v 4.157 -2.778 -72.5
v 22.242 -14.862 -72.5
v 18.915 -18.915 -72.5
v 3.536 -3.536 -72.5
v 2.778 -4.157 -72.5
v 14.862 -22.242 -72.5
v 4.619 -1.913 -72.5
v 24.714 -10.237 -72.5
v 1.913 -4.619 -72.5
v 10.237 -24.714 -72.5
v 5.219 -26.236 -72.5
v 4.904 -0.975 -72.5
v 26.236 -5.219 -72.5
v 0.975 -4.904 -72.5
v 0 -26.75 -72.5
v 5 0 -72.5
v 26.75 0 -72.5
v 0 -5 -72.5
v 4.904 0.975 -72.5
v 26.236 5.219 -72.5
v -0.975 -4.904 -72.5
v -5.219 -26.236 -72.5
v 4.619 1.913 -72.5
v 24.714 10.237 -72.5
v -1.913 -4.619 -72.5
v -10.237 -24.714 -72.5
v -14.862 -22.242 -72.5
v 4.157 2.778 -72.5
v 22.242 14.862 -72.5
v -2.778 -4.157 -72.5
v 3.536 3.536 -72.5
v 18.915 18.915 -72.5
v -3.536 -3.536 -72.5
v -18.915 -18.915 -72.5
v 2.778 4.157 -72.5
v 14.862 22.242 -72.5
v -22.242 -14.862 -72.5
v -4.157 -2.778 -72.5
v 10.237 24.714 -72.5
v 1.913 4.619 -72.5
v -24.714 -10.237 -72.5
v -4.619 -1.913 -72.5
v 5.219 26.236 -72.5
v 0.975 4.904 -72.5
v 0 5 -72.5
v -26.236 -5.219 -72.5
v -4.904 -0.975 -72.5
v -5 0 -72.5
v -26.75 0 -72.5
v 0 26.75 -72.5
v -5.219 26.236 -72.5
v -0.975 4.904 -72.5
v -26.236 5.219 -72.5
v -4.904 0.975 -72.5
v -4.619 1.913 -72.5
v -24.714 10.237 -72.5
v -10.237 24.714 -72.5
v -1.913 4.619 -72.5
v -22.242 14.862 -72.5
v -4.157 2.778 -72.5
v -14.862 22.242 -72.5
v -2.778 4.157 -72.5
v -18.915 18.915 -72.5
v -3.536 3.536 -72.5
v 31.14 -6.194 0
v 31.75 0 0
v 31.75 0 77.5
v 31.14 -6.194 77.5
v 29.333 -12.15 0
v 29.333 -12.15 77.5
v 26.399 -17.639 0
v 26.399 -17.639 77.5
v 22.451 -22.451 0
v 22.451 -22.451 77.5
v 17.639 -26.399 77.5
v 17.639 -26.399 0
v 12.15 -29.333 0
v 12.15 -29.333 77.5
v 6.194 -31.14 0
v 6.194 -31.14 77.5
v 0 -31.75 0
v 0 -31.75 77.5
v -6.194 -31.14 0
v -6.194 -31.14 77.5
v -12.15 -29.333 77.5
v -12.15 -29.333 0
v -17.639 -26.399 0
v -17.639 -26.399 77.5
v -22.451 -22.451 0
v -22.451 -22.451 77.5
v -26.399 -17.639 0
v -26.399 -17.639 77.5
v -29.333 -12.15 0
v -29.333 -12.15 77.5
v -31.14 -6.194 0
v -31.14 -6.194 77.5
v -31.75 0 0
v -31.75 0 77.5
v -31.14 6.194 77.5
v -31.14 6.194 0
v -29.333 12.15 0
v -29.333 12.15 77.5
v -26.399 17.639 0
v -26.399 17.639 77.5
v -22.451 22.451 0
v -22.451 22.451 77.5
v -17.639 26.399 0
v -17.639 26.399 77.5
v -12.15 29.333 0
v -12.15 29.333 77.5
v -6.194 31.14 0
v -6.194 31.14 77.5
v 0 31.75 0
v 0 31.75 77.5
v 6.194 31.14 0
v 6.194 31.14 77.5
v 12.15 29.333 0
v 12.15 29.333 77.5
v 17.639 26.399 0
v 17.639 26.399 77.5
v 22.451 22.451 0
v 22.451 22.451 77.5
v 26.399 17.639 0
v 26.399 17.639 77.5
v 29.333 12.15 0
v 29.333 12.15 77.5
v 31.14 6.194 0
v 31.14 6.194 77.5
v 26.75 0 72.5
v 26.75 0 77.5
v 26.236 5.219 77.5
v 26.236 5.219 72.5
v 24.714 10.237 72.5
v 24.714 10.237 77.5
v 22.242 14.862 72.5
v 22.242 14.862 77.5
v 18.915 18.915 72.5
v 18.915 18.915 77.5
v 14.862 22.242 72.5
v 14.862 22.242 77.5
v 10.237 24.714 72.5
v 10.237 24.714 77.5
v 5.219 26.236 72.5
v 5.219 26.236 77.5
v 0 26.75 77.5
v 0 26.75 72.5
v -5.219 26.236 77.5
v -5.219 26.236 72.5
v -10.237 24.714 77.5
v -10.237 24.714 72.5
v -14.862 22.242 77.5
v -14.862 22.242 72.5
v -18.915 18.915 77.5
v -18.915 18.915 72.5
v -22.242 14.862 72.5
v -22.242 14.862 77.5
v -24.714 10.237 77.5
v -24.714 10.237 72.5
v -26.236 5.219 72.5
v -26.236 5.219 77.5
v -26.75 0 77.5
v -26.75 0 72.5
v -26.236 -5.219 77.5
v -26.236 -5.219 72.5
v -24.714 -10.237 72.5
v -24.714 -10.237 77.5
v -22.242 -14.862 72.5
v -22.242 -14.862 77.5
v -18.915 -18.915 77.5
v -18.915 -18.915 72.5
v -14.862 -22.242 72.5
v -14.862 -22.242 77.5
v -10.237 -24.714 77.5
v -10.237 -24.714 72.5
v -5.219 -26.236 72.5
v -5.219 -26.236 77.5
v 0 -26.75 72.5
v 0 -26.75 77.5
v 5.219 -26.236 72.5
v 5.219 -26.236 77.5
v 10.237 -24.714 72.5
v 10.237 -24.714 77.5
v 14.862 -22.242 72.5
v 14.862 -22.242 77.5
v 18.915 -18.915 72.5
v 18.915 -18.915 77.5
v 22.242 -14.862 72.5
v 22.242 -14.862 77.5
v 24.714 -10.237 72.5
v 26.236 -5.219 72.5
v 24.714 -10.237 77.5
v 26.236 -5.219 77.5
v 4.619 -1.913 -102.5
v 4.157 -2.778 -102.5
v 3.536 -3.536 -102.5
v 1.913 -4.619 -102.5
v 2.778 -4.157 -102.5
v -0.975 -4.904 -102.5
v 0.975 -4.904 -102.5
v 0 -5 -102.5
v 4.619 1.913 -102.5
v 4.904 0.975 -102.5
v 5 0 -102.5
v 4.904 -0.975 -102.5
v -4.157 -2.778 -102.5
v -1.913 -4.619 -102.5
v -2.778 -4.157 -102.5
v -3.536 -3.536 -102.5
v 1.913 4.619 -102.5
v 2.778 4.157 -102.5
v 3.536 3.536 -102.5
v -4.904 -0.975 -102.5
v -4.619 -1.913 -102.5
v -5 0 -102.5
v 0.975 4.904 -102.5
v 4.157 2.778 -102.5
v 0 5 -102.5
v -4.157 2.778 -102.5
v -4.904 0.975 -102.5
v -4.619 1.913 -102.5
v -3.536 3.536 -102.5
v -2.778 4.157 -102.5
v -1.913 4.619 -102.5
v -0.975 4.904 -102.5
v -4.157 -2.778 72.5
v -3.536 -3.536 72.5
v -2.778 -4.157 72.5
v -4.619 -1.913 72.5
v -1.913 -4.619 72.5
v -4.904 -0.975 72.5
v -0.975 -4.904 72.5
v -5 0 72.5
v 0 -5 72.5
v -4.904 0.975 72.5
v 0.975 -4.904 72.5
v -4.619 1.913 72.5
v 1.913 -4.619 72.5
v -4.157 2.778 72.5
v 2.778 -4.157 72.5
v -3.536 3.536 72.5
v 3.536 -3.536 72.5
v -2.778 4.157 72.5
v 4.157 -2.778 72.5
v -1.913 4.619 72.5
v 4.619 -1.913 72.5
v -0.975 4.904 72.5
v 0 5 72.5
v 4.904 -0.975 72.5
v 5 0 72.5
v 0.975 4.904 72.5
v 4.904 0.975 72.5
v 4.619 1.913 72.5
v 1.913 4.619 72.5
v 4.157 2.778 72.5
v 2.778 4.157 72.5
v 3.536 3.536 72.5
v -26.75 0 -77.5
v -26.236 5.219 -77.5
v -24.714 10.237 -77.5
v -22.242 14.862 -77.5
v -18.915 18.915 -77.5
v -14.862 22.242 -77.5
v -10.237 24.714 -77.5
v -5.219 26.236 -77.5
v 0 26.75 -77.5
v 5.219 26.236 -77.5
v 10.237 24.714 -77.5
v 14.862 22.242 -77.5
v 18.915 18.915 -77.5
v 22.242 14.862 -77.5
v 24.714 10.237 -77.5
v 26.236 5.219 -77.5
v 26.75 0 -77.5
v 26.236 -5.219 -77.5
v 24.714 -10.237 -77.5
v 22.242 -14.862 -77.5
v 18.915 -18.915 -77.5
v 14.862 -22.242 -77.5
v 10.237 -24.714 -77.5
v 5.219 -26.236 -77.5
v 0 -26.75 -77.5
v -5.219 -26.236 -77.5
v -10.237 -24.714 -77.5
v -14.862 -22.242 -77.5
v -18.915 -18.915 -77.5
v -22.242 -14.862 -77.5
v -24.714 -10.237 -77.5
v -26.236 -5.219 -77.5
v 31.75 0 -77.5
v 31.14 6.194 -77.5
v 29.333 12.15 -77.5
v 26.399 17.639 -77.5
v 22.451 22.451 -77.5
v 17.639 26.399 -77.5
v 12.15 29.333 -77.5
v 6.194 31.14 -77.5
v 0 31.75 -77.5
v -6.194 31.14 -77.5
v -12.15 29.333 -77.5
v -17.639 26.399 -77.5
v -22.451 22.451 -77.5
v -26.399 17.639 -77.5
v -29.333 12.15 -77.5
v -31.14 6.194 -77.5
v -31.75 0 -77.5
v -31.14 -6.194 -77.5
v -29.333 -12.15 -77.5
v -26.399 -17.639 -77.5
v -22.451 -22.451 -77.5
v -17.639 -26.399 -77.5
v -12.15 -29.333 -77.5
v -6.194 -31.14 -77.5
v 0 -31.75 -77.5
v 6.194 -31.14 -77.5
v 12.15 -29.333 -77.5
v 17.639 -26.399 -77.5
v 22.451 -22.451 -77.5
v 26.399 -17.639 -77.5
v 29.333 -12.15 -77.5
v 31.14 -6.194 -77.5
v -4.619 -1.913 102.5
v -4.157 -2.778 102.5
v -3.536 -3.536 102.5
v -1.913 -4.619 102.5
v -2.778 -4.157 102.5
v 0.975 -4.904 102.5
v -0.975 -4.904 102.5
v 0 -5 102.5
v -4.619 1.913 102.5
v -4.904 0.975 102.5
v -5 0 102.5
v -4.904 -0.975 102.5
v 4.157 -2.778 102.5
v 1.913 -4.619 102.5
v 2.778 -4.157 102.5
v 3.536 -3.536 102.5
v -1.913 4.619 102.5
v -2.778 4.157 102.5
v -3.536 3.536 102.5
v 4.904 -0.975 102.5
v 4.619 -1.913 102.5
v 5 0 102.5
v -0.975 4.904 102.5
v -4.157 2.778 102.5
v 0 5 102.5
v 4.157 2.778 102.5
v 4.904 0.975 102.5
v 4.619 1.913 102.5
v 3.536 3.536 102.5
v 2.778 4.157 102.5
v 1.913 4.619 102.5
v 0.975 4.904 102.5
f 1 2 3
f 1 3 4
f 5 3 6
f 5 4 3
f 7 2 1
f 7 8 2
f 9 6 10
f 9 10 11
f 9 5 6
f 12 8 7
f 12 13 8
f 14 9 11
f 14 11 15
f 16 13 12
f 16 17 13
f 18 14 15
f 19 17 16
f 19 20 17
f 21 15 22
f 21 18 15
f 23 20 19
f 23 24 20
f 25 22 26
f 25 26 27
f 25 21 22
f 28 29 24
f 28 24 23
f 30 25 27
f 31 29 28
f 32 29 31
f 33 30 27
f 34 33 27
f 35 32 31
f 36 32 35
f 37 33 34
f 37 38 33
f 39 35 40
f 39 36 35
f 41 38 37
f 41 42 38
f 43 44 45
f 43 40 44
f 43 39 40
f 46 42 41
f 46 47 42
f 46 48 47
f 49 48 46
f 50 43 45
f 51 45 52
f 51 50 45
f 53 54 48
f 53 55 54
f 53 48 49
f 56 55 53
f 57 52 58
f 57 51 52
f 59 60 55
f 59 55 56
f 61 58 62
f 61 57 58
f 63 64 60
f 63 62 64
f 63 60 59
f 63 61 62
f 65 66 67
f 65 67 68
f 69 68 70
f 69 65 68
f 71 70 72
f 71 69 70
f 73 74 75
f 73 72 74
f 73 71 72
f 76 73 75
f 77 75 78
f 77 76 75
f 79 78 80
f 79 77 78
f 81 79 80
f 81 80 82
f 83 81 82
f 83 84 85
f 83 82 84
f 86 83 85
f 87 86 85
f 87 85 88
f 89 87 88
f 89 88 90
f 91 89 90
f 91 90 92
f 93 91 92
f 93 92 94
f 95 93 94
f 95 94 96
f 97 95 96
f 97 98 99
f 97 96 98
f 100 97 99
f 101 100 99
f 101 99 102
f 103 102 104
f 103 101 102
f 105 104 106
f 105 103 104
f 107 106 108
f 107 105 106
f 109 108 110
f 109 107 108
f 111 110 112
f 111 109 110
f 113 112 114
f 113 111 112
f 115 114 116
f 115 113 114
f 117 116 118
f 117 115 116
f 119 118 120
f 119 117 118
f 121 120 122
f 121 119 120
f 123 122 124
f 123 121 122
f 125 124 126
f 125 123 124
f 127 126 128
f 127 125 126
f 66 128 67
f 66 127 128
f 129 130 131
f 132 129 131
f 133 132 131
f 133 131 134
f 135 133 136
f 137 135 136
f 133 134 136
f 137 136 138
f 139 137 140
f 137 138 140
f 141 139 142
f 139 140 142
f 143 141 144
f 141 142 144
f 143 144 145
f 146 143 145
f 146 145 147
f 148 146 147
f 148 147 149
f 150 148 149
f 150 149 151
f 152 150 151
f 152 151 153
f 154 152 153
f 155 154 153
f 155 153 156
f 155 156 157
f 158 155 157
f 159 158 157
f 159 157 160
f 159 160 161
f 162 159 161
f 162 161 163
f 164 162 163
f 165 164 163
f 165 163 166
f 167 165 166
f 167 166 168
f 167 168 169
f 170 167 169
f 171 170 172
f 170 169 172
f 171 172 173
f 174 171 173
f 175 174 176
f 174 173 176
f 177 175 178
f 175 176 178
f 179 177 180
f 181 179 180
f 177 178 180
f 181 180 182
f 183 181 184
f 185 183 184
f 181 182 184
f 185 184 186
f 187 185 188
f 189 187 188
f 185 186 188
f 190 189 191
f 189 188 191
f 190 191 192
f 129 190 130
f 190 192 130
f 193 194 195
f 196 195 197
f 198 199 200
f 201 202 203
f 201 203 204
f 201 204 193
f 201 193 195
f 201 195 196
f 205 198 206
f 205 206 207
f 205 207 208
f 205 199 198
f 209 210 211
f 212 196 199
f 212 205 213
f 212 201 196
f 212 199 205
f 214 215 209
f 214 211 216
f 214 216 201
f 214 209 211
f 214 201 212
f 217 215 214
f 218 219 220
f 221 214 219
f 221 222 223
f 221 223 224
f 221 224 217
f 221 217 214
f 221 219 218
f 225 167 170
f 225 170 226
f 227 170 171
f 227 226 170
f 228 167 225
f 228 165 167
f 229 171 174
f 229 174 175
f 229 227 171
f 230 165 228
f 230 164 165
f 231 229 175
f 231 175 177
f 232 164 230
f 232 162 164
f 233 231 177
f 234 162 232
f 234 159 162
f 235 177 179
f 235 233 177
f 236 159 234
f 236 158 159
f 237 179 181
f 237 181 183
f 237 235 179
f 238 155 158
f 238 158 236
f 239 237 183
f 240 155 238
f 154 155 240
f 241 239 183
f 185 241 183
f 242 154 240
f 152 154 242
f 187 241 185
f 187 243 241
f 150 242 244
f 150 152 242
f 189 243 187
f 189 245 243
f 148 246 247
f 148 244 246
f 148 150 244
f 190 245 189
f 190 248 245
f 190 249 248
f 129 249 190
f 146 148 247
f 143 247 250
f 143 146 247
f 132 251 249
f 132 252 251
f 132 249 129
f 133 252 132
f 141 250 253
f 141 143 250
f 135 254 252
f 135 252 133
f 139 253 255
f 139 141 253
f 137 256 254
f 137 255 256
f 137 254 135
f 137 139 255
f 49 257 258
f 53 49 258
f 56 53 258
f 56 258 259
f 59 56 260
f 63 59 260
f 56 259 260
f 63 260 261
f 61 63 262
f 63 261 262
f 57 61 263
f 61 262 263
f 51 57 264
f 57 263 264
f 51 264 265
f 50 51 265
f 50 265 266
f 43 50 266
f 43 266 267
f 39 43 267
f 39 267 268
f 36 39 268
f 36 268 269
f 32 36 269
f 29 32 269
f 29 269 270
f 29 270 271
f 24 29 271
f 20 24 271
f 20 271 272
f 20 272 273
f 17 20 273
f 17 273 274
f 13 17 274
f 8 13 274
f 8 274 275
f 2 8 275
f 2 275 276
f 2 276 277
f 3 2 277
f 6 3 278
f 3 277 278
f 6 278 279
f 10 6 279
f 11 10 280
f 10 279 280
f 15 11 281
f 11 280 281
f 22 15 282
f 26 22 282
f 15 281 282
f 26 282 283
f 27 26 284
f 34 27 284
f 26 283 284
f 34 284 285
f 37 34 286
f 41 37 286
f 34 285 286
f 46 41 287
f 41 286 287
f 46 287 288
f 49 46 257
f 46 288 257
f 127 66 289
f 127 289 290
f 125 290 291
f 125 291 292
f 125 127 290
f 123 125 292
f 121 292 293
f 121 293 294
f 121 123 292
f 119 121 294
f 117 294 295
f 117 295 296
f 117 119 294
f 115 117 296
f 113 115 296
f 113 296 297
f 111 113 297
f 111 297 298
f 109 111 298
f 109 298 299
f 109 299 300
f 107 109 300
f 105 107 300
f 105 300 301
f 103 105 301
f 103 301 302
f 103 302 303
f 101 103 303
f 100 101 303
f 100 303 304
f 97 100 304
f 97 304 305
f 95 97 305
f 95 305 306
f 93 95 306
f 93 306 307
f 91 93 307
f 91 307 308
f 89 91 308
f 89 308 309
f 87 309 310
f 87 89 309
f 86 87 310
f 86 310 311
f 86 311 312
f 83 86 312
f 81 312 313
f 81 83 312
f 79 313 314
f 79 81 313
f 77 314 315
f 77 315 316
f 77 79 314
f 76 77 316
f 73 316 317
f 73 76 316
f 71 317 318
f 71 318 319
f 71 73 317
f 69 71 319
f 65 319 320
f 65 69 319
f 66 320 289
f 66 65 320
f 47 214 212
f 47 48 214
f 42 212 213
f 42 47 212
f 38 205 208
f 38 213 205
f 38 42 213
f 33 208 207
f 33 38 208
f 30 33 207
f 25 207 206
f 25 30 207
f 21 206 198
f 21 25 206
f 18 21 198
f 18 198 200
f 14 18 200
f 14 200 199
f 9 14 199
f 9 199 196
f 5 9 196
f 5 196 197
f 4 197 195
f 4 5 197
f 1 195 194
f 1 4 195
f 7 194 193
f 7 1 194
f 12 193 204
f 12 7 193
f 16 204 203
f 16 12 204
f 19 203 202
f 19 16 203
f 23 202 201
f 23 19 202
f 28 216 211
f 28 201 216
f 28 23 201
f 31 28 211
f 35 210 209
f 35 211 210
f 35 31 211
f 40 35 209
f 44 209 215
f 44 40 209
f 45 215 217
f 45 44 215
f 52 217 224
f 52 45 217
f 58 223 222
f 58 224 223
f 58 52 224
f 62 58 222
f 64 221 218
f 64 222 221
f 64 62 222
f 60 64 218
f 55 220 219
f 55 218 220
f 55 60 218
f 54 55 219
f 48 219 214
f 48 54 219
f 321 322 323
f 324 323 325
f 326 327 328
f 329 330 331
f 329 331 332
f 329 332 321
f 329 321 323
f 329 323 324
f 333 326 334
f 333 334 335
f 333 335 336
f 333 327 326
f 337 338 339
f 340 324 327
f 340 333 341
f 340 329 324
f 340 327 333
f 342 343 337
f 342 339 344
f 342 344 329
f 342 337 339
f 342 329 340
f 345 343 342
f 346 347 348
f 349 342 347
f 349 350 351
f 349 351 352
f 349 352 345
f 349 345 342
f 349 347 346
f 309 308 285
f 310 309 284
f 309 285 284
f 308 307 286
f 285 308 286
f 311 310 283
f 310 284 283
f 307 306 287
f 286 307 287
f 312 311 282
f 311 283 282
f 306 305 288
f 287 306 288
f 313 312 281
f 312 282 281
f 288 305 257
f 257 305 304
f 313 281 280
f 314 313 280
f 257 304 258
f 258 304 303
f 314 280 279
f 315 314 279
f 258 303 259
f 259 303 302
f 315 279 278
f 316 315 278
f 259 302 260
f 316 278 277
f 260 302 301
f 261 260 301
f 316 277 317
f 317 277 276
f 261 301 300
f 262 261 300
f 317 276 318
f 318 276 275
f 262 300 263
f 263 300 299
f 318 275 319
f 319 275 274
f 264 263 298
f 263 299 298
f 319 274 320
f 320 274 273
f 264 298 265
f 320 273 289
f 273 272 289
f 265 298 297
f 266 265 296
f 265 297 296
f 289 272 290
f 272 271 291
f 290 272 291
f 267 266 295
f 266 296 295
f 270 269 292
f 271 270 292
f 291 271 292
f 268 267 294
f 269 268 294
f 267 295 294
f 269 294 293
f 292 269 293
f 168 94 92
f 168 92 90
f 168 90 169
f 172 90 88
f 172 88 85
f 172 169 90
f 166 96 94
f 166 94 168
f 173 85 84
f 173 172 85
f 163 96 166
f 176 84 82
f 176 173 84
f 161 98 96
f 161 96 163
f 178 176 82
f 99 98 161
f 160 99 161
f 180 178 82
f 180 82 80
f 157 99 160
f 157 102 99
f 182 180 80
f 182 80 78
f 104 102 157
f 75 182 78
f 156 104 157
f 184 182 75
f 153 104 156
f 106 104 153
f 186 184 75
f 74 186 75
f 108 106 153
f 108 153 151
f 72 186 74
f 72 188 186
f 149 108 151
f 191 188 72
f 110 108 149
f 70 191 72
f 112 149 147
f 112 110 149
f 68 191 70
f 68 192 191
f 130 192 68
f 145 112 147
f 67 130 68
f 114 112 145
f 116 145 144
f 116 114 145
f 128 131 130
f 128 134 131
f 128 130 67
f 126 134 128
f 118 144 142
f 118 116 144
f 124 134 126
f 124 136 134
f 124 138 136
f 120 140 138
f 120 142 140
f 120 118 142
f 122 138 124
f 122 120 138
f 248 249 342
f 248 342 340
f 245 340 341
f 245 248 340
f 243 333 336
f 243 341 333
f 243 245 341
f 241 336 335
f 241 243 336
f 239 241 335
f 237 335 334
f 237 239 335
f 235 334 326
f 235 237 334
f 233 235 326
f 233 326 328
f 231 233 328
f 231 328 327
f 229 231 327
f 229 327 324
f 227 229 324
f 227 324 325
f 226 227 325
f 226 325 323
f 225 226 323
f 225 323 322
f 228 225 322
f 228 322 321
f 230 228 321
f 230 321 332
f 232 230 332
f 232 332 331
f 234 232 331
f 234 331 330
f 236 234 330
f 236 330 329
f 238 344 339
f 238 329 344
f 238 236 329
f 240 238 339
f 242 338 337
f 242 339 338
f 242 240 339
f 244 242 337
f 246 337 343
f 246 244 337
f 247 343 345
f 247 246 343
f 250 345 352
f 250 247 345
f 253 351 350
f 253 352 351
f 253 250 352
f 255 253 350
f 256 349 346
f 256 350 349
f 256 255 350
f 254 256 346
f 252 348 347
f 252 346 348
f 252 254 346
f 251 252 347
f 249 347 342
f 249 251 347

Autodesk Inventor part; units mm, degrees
ref_plane "YZ Plane" through (0, 0, 0) normal (1, 0, 0) x (0, 1, 0)
ref_plane "XZ Plane" through (0, 0, 0) normal (0, 1, 0) x (-1, 0, 0)
ref_plane "XY Plane" through (0, 0, 0) normal (0, 0, 1) x (1, 0, 0)
sketch "Sketch1" plane through (0, 0, 0) normal (0, 0, 1) x (1, 0, 0)
  circle A0 centre (0, 0) radius 31.75
  dimension "d0" = 31.75
extrude "Extrusion1" add sketch "Sketch1" along normal mid plane 155
sketch "Sketch2" plane through (0, 0, -77.5) normal (0, 0, -1) x (-1, 0, 0)
  circle A0 centre (0, 0) radius 26.75
  dimension "d3" = 26.75
extrude "Extrusion2" cut sketch "Sketch2" against normal blind 5
sketch "Sketch3" plane through (0, 0, 77.5) normal (0, 0, 1) x (1, 0, 0)
  circle A0 centre (0, 0) radius 26.75
  dimension "d6" = 26.75
extrude "Extrusion3" cut sketch "Sketch3" against normal blind 5
sketch "Sketch4" plane through (0, 0, -72.5) normal (0, 0, -1) x (-1, 0, 0)
  circle A0 centre (0, 0) radius 5
  dimension "d9" = 5
extrude "Extrusion4" add sketch "Sketch4" along normal blind 30
sketch "Sketch5" plane through (0, 0, 72.5) normal (0, 0, 1) x (1, 0, 0)
  circle A0 centre (0, 0) radius 5
  dimension "d12" = 5
extrude "Extrusion5" add sketch "Sketch5" along normal blind 30
properties part number "Rodo"
